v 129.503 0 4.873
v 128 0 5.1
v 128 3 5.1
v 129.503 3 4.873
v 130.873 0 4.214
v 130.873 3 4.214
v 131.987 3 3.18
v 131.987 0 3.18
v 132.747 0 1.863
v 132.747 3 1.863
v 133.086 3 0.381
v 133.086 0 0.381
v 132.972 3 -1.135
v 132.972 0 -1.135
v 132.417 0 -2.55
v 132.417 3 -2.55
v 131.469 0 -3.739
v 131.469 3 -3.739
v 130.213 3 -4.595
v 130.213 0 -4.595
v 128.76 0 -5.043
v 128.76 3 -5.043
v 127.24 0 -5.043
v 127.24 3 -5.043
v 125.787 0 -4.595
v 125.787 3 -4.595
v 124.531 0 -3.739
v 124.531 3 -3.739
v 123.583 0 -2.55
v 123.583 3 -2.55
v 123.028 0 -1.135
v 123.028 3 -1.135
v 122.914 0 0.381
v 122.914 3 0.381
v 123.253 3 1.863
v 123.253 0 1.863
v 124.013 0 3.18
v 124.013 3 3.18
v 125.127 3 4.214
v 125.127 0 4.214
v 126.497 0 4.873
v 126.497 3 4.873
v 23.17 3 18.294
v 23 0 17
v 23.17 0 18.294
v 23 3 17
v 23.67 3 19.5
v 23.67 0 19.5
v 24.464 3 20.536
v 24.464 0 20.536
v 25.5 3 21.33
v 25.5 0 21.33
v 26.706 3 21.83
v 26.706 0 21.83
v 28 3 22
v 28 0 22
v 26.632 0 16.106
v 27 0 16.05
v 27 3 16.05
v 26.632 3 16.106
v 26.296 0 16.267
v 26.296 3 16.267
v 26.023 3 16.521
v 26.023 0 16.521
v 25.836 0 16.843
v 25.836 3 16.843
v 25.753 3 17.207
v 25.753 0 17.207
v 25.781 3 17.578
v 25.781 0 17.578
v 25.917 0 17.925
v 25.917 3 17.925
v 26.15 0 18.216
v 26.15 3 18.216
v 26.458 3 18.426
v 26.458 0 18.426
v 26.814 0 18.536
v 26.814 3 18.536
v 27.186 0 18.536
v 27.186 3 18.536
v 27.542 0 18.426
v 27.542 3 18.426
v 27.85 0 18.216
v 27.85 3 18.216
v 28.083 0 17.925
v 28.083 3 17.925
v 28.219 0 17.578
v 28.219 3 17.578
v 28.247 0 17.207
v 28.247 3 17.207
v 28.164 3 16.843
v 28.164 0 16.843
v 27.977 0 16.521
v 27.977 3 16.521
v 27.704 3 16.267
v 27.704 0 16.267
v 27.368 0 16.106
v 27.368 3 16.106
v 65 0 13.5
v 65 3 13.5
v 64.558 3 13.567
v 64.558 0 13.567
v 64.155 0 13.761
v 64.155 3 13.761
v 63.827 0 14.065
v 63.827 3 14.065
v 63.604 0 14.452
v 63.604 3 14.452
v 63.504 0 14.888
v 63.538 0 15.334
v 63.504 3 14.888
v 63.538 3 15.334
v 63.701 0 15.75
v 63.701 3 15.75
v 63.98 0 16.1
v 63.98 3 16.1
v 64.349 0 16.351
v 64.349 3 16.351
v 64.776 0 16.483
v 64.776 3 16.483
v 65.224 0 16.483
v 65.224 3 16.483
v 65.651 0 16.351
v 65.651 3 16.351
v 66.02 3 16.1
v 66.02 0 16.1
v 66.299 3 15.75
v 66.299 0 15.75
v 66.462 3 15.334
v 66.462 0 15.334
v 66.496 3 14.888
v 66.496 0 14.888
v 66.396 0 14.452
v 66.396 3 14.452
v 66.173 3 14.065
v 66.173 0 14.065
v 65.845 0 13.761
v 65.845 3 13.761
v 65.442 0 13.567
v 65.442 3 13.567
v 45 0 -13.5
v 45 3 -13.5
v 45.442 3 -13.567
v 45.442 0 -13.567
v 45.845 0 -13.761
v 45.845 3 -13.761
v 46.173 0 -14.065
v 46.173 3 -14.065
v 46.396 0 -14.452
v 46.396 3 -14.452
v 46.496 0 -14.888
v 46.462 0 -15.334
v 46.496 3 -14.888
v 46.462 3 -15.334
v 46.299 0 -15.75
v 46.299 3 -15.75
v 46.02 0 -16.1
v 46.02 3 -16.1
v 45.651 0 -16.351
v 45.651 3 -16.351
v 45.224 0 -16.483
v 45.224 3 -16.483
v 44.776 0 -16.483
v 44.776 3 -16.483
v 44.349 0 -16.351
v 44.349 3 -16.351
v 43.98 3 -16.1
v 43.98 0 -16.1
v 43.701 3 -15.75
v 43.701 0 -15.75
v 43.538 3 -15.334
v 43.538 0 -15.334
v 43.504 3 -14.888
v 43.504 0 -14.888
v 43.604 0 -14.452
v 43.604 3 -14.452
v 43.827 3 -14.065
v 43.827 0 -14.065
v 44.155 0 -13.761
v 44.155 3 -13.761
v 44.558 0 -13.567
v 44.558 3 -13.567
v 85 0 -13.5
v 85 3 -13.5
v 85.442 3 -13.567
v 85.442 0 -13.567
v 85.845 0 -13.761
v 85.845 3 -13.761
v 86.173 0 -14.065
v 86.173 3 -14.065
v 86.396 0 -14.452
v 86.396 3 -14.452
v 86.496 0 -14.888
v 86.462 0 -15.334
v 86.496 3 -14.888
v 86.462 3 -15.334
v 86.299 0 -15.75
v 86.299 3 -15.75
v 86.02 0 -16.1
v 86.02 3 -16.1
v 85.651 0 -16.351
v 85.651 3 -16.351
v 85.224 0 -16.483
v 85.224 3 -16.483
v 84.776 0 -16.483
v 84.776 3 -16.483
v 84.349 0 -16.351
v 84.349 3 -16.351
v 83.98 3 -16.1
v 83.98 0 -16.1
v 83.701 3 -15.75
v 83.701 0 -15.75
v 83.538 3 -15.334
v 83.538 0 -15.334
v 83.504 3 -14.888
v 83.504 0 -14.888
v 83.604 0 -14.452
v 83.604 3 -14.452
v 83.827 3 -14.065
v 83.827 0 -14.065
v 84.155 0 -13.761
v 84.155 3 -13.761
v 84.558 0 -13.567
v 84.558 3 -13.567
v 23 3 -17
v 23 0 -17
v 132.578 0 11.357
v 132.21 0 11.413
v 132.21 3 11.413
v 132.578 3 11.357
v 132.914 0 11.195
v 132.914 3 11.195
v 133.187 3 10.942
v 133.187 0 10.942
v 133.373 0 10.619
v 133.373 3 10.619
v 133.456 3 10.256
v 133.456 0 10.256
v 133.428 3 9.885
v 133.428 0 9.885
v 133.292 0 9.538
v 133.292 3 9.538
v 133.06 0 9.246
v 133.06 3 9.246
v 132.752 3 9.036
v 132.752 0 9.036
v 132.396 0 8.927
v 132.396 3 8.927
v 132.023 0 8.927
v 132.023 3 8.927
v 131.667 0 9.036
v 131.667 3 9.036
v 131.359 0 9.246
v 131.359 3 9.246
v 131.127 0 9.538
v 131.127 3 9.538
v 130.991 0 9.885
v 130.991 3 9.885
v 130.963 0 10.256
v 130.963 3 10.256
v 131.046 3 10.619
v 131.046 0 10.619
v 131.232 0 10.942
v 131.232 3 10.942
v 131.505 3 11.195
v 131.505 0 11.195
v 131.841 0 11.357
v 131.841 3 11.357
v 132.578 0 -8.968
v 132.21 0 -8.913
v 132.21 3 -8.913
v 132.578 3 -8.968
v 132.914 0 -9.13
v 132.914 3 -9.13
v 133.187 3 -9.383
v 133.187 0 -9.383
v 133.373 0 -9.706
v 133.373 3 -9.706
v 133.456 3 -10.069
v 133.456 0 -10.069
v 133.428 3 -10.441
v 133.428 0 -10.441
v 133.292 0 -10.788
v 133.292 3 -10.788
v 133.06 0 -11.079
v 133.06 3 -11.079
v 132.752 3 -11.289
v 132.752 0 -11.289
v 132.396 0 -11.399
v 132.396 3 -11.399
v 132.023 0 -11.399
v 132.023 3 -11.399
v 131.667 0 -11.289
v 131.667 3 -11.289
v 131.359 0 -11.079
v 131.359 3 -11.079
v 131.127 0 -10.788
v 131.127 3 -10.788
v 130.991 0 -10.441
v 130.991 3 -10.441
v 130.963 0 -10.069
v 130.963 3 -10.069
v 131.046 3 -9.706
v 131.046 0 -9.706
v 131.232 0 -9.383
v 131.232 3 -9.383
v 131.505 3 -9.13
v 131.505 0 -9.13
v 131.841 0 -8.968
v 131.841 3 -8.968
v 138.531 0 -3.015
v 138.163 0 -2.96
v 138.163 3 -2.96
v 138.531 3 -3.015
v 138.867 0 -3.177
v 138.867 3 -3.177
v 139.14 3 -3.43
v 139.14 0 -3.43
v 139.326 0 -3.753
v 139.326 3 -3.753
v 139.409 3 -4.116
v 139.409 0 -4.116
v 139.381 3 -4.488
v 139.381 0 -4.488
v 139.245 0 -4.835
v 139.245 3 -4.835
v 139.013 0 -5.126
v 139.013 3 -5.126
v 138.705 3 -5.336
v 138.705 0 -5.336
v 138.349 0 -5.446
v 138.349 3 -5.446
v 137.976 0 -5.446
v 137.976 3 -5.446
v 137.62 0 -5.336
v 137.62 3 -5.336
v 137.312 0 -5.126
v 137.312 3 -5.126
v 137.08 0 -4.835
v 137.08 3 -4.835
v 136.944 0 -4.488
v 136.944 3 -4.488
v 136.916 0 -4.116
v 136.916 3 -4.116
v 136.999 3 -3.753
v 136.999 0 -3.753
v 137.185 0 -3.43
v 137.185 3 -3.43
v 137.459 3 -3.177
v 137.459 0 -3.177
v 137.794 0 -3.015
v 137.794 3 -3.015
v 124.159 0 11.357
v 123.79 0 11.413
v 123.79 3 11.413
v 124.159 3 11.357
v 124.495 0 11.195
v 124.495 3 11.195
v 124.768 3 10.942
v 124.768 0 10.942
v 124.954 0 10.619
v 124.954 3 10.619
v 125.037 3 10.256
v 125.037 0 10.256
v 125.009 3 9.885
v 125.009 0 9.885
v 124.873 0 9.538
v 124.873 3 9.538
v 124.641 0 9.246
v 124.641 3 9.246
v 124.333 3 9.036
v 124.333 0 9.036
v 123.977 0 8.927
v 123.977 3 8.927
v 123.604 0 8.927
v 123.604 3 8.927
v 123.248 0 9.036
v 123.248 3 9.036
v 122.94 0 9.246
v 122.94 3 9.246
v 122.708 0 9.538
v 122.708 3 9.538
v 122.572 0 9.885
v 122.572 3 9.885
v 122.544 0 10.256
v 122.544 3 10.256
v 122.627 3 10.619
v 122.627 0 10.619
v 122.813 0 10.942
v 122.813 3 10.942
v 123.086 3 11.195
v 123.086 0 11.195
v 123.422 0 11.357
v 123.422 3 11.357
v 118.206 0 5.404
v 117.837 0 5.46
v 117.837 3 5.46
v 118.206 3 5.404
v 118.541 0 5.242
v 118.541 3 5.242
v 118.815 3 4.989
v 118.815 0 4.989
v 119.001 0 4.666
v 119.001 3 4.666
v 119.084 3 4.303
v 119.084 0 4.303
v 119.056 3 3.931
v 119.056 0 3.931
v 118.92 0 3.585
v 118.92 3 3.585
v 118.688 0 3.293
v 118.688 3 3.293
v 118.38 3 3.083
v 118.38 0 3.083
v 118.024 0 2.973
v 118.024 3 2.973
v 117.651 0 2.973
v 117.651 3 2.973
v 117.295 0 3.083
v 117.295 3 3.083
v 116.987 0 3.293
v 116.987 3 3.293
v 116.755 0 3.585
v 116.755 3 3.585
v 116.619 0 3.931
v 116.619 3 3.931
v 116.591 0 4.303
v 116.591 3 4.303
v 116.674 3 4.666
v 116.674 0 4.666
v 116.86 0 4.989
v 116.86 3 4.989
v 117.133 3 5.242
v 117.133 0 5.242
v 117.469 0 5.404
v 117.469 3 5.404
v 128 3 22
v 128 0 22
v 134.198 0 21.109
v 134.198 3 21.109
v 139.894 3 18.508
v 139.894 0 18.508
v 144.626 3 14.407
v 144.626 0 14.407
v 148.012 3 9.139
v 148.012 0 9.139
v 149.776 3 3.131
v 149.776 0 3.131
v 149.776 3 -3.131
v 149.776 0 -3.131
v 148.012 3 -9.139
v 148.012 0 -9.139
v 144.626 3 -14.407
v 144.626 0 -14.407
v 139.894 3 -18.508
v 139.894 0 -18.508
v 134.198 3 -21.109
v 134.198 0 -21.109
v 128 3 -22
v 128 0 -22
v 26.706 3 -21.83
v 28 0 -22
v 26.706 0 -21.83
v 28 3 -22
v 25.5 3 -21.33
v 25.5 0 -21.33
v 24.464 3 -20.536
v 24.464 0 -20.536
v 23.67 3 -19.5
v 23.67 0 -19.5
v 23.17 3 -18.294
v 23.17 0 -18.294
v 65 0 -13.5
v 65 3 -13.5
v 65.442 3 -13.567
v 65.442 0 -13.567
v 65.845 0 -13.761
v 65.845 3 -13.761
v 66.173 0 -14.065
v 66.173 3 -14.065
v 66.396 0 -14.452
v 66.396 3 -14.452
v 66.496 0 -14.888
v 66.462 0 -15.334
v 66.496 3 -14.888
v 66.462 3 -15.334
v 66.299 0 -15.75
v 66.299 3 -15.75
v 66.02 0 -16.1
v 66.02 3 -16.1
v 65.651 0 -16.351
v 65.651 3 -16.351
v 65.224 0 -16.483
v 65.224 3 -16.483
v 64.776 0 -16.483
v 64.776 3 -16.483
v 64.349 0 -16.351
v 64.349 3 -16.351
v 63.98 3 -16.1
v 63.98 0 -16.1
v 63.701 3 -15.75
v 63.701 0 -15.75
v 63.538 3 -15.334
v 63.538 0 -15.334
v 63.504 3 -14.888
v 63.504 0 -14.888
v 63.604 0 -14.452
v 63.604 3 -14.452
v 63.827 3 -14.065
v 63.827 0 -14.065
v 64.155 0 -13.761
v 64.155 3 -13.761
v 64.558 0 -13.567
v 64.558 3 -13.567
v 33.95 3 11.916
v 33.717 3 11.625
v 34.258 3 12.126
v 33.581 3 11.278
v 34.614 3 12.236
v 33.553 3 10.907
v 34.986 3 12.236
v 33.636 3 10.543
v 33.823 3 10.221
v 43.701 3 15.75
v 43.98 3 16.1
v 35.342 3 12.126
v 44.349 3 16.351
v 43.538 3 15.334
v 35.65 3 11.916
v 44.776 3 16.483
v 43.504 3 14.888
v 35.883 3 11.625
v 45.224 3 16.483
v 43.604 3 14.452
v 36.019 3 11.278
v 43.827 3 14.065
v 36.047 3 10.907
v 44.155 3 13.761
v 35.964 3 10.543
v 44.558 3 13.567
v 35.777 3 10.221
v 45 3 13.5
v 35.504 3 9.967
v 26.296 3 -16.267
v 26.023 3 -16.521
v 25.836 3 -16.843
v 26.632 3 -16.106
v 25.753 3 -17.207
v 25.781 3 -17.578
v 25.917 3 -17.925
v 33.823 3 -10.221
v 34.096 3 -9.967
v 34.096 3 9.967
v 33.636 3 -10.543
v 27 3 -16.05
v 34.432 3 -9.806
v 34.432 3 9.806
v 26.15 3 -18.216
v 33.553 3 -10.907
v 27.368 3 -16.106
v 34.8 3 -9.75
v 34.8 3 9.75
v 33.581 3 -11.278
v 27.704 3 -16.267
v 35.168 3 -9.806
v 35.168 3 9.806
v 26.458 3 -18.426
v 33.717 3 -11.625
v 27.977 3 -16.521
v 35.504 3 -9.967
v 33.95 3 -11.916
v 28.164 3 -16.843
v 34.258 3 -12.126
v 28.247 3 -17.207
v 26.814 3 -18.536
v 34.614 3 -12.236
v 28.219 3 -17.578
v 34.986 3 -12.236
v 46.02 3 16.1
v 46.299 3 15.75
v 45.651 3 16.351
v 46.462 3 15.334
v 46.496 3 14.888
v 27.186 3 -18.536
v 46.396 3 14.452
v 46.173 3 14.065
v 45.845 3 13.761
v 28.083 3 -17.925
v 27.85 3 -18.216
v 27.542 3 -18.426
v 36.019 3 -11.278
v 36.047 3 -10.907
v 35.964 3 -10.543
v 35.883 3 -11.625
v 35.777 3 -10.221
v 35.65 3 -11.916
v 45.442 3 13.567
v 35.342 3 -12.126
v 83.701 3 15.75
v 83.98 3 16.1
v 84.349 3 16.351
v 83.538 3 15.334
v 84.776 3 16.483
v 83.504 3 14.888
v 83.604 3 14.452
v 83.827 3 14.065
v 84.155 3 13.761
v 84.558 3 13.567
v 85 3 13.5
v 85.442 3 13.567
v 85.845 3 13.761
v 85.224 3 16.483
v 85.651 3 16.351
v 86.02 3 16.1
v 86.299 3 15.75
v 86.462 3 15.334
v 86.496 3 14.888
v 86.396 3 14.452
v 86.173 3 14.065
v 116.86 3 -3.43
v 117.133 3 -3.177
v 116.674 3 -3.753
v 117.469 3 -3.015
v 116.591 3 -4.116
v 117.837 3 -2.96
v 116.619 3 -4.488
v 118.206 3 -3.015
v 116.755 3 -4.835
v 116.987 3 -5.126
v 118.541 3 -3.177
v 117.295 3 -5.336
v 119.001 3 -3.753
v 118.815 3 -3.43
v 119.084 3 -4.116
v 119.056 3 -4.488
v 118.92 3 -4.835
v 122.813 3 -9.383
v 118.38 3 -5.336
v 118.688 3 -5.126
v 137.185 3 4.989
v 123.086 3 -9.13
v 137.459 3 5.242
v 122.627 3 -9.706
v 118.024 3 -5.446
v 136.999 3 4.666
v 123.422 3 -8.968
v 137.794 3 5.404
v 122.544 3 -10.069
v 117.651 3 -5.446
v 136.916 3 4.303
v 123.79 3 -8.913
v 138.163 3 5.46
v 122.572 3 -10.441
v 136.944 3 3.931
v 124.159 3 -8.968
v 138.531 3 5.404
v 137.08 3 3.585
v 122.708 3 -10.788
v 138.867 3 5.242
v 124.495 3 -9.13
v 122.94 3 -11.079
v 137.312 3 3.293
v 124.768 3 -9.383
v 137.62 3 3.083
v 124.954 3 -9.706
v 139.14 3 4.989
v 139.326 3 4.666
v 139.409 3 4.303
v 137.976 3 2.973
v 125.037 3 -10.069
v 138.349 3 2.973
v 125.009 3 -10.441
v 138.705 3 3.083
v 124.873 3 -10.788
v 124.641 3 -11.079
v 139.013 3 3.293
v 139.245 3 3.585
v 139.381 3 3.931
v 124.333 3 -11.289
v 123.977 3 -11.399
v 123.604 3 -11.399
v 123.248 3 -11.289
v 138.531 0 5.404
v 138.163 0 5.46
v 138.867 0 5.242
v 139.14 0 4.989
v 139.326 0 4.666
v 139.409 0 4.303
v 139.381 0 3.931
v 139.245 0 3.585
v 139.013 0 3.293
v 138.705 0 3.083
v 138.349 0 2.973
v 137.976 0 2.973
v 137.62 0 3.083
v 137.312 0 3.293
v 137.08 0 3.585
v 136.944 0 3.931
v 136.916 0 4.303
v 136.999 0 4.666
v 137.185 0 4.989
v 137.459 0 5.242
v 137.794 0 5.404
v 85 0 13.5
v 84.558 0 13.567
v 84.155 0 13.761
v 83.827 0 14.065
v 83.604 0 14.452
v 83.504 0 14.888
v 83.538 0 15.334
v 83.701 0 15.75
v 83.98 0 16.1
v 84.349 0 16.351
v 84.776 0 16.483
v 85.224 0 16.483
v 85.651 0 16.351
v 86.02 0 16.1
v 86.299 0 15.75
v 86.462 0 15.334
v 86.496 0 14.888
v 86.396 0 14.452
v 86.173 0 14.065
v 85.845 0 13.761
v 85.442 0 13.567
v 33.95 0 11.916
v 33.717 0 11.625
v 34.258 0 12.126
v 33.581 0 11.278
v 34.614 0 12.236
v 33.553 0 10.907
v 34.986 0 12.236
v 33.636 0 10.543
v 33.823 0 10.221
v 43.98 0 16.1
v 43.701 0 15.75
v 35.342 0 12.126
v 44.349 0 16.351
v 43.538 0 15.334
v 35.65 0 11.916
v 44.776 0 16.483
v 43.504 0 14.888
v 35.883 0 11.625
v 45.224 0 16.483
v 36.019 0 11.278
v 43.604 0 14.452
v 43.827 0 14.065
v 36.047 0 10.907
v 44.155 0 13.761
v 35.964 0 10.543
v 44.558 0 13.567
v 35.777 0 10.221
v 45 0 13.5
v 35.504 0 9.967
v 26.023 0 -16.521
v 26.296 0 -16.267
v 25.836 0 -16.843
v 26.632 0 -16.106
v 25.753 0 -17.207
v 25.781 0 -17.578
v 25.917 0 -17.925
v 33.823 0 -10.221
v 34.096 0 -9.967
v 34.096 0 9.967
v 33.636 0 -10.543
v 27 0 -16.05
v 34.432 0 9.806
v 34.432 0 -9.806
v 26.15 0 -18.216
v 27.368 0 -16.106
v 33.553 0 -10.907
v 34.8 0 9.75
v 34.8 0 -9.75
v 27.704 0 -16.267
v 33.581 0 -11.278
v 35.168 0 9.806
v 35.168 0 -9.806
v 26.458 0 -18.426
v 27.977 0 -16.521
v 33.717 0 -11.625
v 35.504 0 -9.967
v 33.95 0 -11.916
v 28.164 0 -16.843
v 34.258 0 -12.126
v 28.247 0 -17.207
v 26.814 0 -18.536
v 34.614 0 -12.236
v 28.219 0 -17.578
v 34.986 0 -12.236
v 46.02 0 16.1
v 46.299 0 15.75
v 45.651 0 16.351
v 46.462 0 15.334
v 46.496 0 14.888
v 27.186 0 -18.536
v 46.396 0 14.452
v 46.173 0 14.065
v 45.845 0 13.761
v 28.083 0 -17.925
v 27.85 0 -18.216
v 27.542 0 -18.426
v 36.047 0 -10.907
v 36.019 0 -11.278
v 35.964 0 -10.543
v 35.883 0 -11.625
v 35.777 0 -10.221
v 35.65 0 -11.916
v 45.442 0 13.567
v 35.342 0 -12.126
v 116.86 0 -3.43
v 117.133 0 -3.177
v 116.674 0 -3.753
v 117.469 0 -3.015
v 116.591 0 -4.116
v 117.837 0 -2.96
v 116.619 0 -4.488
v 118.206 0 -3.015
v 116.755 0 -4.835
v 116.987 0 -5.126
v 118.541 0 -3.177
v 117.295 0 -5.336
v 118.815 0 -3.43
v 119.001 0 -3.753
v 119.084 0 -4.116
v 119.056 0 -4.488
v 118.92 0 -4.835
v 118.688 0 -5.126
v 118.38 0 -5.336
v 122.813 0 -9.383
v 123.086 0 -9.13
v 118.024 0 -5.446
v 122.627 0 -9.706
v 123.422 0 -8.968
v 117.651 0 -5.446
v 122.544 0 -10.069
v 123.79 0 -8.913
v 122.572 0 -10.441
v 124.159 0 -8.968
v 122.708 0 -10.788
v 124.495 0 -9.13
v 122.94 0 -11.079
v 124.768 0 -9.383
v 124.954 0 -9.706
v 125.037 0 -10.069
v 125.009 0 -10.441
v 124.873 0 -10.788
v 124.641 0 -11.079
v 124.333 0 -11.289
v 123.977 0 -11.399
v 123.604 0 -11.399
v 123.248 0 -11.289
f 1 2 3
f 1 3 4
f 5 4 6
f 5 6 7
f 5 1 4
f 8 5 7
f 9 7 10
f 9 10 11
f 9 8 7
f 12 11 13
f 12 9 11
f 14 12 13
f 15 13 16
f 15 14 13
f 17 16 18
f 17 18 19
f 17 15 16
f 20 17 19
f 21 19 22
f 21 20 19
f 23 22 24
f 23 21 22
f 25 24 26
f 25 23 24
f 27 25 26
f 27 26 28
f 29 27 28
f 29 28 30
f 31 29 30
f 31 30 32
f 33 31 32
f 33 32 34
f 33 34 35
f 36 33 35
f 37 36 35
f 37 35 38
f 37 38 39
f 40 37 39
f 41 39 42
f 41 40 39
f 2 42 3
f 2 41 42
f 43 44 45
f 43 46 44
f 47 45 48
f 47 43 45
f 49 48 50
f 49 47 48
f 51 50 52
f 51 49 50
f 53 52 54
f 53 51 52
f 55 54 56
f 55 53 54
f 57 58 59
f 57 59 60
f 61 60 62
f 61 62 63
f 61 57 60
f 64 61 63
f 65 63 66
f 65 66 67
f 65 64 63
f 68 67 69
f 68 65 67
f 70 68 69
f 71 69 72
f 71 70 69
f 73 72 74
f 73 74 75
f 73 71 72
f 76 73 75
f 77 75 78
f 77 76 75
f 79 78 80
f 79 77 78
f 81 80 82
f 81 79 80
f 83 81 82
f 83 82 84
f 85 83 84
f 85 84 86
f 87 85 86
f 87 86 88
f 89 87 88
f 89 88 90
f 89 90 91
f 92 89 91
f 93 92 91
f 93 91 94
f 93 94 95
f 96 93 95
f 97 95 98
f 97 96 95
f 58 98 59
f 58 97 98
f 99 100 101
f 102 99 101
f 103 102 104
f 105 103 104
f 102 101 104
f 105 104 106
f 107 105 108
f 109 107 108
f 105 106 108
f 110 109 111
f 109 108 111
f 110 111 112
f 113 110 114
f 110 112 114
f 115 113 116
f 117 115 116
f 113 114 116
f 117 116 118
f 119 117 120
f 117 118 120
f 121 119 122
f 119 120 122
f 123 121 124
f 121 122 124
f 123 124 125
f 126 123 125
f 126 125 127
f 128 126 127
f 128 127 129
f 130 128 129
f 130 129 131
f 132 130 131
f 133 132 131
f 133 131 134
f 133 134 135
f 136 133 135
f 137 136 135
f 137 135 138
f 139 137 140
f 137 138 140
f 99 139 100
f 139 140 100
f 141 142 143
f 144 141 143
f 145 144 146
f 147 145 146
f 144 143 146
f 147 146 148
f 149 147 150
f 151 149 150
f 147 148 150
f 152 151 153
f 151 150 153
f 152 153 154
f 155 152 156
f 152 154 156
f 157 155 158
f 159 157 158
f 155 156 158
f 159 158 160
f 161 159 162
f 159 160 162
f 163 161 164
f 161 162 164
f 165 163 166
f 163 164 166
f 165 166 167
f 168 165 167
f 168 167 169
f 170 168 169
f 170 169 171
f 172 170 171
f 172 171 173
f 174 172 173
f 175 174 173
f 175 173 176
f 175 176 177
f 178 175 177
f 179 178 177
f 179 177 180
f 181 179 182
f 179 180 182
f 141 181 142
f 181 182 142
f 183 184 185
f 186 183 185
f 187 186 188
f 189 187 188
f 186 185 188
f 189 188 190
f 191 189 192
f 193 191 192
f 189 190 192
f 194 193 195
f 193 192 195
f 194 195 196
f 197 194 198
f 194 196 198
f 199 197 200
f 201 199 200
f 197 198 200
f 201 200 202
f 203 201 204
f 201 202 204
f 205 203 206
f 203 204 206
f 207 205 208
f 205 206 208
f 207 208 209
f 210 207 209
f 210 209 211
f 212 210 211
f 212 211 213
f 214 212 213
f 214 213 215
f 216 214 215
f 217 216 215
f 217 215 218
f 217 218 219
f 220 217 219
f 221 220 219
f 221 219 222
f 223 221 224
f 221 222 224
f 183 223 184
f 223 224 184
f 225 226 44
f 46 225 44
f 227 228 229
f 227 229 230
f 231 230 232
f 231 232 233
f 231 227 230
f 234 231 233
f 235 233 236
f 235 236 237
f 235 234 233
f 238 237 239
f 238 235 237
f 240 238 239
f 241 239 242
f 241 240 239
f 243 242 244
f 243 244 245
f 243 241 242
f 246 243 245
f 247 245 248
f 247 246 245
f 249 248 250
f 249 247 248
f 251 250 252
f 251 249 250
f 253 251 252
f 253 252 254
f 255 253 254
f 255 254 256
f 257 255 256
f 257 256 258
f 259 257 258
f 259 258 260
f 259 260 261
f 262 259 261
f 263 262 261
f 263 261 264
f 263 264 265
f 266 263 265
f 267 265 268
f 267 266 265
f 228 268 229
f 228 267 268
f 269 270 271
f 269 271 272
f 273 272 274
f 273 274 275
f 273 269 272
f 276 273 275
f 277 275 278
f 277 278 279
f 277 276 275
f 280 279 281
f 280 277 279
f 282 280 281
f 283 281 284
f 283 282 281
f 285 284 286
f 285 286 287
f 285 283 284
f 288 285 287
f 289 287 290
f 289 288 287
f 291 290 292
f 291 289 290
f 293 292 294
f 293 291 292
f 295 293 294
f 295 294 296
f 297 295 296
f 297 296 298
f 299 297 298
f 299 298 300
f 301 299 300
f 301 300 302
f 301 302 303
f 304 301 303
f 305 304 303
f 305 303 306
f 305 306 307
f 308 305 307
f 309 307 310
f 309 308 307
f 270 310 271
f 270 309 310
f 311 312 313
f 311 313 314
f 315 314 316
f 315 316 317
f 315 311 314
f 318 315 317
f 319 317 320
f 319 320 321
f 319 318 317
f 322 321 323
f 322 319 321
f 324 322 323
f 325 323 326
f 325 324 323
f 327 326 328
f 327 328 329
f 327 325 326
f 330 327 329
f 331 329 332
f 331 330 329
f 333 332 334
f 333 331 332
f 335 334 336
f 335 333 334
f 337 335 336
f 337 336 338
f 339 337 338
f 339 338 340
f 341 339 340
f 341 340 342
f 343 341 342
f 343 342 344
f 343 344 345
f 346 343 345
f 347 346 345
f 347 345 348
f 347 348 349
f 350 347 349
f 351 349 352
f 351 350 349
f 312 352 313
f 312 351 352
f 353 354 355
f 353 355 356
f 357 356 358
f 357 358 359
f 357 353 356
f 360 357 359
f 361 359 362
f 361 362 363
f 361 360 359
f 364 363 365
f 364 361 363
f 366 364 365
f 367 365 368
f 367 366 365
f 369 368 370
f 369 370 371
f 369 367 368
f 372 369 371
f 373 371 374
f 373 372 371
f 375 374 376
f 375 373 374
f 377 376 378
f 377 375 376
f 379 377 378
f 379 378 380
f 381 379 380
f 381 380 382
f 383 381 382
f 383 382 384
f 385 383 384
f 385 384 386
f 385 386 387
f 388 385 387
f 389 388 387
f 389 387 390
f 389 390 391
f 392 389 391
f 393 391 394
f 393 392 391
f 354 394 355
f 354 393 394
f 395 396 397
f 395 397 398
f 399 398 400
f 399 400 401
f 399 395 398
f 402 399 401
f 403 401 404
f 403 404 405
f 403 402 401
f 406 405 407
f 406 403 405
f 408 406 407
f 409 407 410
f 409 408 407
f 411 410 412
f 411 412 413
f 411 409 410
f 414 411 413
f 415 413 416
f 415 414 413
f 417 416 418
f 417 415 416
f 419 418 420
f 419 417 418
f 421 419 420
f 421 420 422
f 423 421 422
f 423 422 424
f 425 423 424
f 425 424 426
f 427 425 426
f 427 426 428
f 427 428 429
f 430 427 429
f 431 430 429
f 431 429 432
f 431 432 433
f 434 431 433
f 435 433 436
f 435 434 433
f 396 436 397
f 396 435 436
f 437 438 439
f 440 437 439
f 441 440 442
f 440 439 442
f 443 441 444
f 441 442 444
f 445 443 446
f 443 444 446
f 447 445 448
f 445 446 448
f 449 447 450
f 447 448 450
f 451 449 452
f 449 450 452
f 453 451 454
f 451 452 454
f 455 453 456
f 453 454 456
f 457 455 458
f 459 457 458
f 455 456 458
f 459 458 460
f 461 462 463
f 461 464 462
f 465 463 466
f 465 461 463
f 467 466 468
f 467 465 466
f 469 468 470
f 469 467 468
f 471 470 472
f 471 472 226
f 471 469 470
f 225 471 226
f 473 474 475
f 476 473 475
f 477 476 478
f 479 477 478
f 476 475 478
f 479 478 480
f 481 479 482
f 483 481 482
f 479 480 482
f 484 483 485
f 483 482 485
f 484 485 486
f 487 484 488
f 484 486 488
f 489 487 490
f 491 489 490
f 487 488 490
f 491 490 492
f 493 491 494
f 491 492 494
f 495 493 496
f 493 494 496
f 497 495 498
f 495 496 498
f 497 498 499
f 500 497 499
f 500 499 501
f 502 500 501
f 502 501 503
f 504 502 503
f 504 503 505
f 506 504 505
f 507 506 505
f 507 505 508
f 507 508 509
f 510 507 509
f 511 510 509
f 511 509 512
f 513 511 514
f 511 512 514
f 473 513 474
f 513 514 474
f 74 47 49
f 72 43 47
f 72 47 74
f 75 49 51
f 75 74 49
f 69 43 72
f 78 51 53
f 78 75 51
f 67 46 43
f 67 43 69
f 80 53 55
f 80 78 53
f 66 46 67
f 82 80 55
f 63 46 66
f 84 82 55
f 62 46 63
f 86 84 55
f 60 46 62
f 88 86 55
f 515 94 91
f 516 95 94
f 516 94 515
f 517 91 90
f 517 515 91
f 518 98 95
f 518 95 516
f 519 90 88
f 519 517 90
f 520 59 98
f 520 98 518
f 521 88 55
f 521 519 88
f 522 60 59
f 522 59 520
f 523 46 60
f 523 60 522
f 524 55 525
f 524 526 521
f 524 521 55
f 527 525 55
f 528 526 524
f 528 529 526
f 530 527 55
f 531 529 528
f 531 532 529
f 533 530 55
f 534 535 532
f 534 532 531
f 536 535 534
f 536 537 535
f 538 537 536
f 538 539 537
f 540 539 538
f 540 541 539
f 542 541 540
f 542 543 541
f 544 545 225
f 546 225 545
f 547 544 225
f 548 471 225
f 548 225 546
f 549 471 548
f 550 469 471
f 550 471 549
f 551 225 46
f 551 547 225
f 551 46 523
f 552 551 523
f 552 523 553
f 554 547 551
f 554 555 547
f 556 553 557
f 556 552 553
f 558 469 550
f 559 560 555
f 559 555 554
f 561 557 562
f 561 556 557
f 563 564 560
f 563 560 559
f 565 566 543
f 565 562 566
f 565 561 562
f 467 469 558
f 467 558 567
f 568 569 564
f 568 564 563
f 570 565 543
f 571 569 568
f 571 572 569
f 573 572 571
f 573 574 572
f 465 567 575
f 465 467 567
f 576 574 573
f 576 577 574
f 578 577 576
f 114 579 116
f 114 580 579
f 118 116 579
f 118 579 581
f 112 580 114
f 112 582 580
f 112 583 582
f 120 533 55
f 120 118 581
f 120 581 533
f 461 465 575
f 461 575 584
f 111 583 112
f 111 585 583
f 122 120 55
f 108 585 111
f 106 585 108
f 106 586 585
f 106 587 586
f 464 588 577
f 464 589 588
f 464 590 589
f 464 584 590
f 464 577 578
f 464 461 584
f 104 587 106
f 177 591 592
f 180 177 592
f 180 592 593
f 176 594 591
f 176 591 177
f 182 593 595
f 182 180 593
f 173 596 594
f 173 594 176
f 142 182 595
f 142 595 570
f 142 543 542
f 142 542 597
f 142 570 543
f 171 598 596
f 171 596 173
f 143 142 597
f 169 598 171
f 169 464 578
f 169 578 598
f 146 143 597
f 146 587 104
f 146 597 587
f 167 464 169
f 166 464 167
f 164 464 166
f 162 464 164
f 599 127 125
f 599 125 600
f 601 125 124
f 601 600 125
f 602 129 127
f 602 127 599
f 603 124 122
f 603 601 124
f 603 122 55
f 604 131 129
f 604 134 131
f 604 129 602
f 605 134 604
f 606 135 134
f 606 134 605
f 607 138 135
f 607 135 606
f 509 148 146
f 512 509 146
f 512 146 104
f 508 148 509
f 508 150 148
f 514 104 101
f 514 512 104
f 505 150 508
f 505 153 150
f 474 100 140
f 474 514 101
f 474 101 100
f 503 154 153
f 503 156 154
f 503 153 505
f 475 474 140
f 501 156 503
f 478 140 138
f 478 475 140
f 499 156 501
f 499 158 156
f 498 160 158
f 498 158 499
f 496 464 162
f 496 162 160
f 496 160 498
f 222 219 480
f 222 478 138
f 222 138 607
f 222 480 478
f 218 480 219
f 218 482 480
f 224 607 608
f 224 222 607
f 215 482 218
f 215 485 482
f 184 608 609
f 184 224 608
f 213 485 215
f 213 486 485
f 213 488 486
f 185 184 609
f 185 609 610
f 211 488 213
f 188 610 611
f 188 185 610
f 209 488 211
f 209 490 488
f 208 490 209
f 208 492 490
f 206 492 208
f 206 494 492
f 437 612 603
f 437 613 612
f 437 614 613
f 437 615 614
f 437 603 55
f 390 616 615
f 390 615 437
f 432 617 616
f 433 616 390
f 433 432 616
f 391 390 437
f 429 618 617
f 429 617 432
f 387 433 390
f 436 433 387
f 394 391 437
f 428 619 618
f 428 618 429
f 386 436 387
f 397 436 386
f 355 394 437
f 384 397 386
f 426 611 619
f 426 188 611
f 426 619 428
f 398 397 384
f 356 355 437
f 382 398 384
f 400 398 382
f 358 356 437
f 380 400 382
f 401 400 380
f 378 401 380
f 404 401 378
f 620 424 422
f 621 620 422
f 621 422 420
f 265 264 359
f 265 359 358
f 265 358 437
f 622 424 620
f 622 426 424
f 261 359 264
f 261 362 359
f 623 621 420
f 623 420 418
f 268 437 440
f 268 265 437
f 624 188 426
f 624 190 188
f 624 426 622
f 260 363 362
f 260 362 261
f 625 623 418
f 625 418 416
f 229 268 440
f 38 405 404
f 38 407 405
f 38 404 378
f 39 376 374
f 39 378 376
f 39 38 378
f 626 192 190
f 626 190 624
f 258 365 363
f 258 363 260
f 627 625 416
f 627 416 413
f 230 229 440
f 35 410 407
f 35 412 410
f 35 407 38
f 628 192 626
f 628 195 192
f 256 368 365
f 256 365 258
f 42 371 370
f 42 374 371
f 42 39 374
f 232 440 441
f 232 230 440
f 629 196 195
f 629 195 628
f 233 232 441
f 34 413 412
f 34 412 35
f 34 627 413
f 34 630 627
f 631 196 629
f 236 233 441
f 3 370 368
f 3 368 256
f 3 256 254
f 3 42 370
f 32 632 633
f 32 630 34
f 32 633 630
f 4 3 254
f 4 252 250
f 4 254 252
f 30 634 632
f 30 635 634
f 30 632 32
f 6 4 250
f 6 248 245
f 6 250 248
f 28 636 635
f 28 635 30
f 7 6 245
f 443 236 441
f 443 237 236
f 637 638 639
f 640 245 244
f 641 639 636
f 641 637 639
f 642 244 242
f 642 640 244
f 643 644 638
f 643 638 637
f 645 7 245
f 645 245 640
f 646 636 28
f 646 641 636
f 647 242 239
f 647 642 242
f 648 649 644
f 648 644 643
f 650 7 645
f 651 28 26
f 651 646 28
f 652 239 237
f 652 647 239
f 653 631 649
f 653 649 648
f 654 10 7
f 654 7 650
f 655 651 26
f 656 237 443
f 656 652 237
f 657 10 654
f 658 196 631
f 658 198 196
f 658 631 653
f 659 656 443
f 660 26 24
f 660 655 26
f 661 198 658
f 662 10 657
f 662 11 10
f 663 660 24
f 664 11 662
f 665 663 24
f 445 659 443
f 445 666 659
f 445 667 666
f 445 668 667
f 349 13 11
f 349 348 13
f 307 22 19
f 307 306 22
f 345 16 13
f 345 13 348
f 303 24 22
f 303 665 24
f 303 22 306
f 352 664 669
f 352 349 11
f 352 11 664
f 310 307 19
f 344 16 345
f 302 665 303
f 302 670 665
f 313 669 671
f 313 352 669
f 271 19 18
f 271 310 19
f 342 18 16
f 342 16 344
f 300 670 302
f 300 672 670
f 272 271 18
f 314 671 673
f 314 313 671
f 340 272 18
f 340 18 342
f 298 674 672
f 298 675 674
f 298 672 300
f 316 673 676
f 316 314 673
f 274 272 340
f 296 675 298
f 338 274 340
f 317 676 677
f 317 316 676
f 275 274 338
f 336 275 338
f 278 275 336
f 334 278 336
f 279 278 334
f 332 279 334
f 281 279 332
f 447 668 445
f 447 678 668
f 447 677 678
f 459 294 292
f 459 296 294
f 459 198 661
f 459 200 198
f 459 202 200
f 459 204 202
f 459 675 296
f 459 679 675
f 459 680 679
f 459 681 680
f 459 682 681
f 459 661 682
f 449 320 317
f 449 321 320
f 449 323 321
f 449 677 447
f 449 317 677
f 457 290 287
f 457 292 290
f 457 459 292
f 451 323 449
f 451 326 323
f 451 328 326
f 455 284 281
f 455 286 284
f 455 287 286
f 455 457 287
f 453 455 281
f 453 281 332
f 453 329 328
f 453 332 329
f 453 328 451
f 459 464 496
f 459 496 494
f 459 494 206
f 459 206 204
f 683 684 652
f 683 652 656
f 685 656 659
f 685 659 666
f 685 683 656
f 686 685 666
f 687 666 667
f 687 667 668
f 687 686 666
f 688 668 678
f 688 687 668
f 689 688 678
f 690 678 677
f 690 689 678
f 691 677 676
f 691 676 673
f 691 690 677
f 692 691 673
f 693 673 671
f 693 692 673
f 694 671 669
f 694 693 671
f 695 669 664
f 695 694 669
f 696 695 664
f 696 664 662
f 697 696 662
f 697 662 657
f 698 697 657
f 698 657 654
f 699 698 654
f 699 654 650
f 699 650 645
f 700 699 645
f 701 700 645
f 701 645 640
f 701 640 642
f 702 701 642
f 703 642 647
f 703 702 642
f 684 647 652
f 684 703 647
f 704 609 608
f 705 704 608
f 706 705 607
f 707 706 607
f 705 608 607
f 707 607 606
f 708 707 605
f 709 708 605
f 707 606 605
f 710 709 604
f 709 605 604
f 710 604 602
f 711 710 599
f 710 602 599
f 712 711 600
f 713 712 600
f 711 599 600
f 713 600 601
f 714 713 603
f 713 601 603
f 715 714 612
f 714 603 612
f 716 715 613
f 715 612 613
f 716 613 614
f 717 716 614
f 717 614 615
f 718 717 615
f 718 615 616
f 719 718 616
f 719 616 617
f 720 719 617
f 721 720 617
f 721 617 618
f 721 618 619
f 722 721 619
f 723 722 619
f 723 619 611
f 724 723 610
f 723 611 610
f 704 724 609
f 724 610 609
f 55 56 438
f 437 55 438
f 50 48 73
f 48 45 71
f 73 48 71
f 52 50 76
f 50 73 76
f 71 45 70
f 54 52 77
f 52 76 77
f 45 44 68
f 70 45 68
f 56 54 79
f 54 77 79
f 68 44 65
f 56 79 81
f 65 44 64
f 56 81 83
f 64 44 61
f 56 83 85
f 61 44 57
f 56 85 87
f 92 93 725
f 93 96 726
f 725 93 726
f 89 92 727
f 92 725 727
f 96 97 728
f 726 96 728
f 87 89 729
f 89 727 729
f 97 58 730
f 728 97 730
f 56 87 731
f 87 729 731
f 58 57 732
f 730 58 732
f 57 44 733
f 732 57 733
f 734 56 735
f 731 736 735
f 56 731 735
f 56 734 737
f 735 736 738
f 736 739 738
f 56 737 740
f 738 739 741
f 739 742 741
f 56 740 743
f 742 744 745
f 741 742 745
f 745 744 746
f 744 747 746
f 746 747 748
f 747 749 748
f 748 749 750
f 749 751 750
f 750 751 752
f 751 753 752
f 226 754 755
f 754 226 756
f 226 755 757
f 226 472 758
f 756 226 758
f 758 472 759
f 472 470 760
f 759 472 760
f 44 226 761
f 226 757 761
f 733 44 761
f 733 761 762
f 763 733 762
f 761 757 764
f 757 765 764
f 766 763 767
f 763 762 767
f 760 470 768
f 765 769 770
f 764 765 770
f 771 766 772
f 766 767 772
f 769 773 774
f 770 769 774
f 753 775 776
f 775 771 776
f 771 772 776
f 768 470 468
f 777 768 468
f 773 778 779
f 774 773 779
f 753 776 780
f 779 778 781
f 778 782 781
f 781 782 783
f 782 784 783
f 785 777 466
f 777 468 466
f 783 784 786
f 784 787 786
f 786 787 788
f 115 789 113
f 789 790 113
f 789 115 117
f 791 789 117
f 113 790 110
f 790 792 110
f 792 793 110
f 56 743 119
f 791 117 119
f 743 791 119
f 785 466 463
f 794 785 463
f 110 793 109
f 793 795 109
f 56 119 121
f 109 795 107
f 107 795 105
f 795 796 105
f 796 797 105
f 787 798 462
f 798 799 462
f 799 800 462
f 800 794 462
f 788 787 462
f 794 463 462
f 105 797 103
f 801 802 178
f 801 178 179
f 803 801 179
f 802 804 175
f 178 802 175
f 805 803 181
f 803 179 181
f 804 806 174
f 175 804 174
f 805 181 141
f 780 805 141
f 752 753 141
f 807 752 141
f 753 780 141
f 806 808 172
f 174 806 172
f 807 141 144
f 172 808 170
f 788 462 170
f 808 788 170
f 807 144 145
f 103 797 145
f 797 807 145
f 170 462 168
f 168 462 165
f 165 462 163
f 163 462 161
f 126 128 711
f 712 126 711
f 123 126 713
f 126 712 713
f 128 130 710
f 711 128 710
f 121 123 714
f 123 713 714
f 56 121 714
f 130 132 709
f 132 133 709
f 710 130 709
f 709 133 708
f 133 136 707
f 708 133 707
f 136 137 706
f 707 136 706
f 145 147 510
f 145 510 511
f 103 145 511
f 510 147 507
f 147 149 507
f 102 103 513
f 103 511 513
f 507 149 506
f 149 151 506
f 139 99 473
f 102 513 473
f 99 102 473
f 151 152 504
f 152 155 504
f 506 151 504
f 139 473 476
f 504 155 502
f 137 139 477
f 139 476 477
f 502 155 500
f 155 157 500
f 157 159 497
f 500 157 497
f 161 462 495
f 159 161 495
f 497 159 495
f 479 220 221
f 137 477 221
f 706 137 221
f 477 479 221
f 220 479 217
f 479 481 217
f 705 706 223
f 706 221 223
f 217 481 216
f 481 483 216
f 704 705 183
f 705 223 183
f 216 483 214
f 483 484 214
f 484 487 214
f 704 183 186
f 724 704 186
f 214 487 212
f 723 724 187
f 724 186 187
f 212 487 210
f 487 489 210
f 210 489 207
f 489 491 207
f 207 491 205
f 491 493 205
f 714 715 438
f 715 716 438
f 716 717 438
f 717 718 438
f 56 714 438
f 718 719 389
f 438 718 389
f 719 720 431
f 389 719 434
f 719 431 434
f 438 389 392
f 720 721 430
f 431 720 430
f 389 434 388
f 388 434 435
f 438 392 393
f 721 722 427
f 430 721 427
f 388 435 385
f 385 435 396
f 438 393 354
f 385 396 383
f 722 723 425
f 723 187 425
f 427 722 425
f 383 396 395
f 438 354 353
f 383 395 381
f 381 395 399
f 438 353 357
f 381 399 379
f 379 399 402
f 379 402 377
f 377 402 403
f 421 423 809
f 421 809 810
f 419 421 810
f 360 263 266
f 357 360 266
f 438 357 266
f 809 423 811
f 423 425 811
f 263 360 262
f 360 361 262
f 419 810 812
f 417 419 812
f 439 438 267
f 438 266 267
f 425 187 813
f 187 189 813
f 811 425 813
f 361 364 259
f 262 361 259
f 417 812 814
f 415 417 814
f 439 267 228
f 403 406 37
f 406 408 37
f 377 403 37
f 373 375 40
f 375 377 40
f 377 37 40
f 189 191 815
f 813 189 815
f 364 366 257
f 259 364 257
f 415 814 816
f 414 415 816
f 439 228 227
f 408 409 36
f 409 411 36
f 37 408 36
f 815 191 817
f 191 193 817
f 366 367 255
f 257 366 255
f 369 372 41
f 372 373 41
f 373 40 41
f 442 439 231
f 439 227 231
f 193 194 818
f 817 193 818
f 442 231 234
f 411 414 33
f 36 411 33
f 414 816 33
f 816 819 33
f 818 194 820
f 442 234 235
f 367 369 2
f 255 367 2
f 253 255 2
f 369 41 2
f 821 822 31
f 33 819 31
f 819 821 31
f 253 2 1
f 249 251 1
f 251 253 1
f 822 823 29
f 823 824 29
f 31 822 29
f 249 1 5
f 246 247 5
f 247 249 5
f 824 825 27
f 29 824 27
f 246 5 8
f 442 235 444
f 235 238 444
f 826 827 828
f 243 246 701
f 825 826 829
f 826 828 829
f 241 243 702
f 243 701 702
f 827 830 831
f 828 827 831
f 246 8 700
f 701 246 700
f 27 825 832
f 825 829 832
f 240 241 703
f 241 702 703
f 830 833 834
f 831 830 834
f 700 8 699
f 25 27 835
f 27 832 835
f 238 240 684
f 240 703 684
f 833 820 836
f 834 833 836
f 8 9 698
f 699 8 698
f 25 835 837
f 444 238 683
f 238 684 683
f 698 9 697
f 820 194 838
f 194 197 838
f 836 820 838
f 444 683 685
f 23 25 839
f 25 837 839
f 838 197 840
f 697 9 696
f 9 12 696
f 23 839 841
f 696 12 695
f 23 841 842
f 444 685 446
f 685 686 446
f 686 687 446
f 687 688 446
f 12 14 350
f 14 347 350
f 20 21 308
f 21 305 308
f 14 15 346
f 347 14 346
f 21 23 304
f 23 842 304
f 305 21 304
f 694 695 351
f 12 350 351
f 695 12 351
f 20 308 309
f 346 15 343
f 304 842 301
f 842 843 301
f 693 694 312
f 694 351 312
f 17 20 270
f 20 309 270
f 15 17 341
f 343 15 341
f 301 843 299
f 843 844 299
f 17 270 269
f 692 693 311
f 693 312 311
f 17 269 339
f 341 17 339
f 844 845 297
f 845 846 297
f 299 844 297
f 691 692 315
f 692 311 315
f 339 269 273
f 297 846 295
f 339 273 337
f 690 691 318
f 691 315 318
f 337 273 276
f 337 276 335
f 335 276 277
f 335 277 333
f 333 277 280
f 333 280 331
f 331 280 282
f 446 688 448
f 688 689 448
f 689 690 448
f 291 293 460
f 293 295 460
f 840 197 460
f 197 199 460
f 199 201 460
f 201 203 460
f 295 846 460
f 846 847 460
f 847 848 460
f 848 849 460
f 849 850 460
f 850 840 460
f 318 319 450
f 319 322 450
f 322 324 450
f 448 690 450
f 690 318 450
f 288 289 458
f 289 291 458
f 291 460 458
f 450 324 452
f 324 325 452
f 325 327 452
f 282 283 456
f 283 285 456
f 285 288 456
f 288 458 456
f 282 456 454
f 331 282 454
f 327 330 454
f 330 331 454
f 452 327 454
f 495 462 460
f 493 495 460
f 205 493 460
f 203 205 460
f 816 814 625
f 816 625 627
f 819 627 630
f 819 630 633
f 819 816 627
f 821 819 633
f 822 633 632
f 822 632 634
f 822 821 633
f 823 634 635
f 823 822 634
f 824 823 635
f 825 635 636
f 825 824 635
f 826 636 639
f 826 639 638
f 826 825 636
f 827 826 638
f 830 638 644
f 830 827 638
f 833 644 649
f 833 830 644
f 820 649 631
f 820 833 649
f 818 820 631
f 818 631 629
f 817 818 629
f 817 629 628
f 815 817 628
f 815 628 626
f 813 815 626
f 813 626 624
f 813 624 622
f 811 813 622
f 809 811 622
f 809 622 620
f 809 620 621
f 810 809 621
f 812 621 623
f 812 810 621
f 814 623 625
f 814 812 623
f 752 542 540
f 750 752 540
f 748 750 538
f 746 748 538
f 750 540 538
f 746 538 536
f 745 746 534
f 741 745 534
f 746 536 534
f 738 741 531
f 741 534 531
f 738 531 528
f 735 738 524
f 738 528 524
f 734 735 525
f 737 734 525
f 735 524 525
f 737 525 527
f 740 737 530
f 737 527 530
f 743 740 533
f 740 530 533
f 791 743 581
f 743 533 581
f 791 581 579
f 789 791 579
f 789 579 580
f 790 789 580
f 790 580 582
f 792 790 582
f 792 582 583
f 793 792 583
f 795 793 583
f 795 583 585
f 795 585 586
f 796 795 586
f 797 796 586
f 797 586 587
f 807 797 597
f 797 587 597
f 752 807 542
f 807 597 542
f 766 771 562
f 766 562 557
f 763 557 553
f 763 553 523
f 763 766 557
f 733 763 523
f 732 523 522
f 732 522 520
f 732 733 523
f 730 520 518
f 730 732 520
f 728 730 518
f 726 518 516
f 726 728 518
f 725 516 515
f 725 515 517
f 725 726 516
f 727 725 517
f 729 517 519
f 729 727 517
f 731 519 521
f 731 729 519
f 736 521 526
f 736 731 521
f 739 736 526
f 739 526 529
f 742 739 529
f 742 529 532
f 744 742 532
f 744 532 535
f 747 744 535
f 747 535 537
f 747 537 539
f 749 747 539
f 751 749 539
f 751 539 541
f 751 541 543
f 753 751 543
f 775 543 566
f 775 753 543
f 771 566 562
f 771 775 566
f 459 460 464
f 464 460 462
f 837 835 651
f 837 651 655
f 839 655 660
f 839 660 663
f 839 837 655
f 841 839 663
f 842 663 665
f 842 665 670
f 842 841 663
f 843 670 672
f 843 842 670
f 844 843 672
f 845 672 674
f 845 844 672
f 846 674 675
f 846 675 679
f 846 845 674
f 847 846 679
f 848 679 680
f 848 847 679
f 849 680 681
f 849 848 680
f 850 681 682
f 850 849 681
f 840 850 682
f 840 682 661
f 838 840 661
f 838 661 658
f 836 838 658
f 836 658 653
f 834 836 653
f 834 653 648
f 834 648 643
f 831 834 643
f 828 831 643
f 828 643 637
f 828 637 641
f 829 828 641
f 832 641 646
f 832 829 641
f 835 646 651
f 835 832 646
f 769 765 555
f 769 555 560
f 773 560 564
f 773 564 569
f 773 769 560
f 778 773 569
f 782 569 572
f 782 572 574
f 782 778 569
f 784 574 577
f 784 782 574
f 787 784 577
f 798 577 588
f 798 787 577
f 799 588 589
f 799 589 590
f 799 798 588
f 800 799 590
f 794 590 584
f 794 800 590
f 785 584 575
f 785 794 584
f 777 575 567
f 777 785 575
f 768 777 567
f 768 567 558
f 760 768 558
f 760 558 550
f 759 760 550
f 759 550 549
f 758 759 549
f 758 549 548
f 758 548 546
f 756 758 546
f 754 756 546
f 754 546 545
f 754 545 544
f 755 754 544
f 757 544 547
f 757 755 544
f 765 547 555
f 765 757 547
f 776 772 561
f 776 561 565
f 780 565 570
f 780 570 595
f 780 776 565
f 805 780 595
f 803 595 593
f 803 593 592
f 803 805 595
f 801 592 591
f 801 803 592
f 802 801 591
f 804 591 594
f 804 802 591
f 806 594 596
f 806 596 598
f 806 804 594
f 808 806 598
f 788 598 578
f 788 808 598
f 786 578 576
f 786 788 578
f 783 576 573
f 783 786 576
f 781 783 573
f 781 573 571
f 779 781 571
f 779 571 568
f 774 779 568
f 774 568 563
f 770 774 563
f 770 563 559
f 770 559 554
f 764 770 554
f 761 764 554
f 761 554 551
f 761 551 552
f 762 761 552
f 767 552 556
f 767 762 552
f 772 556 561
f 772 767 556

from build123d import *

# Parameters (mm, degrees)
SKETCH1_R           = 5.1
SKETCH1_R_2         = 1.25
BOSS_EXTRUDE1_DEPTH = 3
FILLET1_R           = 1.5
SKETCH3_R           = 1.5
CUT_EXTRUDE2_DEPTH  = 3
SKETCH4_W           = 33.045580095
SKETCH4_H           = 44
CUT_EXTRUDE3_DEPTH  = 10
FILLET2_R           = 5


with BuildPart() as part:
    # Sketch1 → Boss-Extrude1 (new body)
    with BuildSketch(Plane(origin=(0, 0, 0), x_dir=(1, 0, 0), z_dir=(0, 1, 0))):
        with BuildLine():
            Line((128, 22), (0, 22))
            Line((0, 22), (0, 16.492422502))
            ThreePointArc((0, 16.492422502), (8, 0), (0, -16.492422502))
            Line((0, -16.492422502), (0, -22))
            Line((0, -22), (128, -22))
            ThreePointArc((128, -22), (150, 0), (128, 22))
        make_face()
        with Locations(Location((128, 0, 0), (0, 0, 270))):
            Circle(SKETCH1_R, mode=Mode.SUBTRACT)
        with Locations(Location((117.837325142, 4.209517756, 0), (0, 0, 270))):
            Circle(SKETCH1_R_2, mode=Mode.SUBTRACT)
        with Locations(Location((123.790482244, 10.162674858, 0), (0, 0, 270))):
            Circle(SKETCH1_R_2, mode=Mode.SUBTRACT)
        with Locations(Location((132.209517756, 10.162674858, 0), (0, 0, 270))):
            Circle(SKETCH1_R_2, mode=Mode.SUBTRACT)
        with Locations(Location((138.162674858, 4.209517756, 0), (0, 0, 270))):
            Circle(SKETCH1_R_2, mode=Mode.SUBTRACT)
        with Locations(Location((138.162674858, -4.209517756, 0), (0, 0, 270))):
            Circle(SKETCH1_R_2, mode=Mode.SUBTRACT)
        with Locations(Location((132.209517756, -10.162674858, 0), (0, 0, 270))):
            Circle(SKETCH1_R_2, mode=Mode.SUBTRACT)
        with Locations(Location((5, 17.3, 0), (0, 0, 270))):
            Circle(SKETCH1_R_2, mode=Mode.SUBTRACT)
        with Locations(Location((27, 17.3, 0), (0, 0, 270))):
            Circle(SKETCH1_R_2, mode=Mode.SUBTRACT)
        with Locations(Location((27, -17.3, 0), (0, 0, 90))):
            Circle(SKETCH1_R_2, mode=Mode.SUBTRACT)
        with Locations(Location((5, -17.3, 0), (0, 0, 90))):
            Circle(SKETCH1_R_2, mode=Mode.SUBTRACT)
        with Locations(Location((123.790482244, -10.162674858, 0), (0, 0, 270))):
            Circle(SKETCH1_R_2, mode=Mode.SUBTRACT)
        with Locations(Location((117.837325142, -4.209517756, 0), (0, 0, 270))):
            Circle(SKETCH1_R_2, mode=Mode.SUBTRACT)
        with Locations(Location((34.8, 11, 0), (0, 0, 270))):
            Circle(SKETCH1_R_2, mode=Mode.SUBTRACT)
        with Locations(Location((34.8, -11, 0), (0, 0, 90))):
            Circle(SKETCH1_R_2, mode=Mode.SUBTRACT)
    extrude(amount=BOSS_EXTRUDE1_DEPTH)

    # Fillet1
    fillet1_edges = [part.edges().sort_by_distance(p)[0] for p in [
        (0, 1.5, 16.492422502),
        (0, 1.5, -16.492422502),
        (0, 1.5, -22),
        (0, 1.5, 22),
    ]]
    fillet(fillet1_edges, radius=FILLET1_R)

    # Sketch3 → Cut-Extrude2 (cut)
    with BuildSketch(Plane(origin=(0, 3, 0), x_dir=(1, 0, 0), z_dir=(0, 1, 0))):
        with Locations(Location((45, 15, 0), (0, 0, 270))):
            Circle(SKETCH3_R)
        with Locations(Location((65, 15, 0), (0, 0, 270))):
            Circle(SKETCH3_R)
        with Locations(Location((85, 15, 0), (0, 0, 270))):
            Circle(SKETCH3_R)
        with Locations(Location((85, -15, 0), (0, 0, 90))):
            Circle(SKETCH3_R)
        with Locations(Location((65, -15, 0), (0, 0, 90))):
            Circle(SKETCH3_R)
        with Locations(Location((45, -15, 0), (0, 0, 90))):
            Circle(SKETCH3_R)
    extrude(amount=-CUT_EXTRUDE2_DEPTH, mode=Mode.SUBTRACT)

    # Sketch4 → Cut-Extrude3 (cut)
    with BuildSketch(Plane.XZ):
        with Locations((6.477209952, 0)):
            Rectangle(SKETCH4_W, SKETCH4_H)
    extrude(amount=-CUT_EXTRUDE3_DEPTH, mode=Mode.SUBTRACT)

    # Fillet2
    fillet2_edges = [part.edges().sort_by_distance(p)[0] for p in [
        (23, 1.5, 22),
        (23, 1.5, -22),
    ]]
    fillet(fillet2_edges, radius=FILLET2_R)


solid = part.part
